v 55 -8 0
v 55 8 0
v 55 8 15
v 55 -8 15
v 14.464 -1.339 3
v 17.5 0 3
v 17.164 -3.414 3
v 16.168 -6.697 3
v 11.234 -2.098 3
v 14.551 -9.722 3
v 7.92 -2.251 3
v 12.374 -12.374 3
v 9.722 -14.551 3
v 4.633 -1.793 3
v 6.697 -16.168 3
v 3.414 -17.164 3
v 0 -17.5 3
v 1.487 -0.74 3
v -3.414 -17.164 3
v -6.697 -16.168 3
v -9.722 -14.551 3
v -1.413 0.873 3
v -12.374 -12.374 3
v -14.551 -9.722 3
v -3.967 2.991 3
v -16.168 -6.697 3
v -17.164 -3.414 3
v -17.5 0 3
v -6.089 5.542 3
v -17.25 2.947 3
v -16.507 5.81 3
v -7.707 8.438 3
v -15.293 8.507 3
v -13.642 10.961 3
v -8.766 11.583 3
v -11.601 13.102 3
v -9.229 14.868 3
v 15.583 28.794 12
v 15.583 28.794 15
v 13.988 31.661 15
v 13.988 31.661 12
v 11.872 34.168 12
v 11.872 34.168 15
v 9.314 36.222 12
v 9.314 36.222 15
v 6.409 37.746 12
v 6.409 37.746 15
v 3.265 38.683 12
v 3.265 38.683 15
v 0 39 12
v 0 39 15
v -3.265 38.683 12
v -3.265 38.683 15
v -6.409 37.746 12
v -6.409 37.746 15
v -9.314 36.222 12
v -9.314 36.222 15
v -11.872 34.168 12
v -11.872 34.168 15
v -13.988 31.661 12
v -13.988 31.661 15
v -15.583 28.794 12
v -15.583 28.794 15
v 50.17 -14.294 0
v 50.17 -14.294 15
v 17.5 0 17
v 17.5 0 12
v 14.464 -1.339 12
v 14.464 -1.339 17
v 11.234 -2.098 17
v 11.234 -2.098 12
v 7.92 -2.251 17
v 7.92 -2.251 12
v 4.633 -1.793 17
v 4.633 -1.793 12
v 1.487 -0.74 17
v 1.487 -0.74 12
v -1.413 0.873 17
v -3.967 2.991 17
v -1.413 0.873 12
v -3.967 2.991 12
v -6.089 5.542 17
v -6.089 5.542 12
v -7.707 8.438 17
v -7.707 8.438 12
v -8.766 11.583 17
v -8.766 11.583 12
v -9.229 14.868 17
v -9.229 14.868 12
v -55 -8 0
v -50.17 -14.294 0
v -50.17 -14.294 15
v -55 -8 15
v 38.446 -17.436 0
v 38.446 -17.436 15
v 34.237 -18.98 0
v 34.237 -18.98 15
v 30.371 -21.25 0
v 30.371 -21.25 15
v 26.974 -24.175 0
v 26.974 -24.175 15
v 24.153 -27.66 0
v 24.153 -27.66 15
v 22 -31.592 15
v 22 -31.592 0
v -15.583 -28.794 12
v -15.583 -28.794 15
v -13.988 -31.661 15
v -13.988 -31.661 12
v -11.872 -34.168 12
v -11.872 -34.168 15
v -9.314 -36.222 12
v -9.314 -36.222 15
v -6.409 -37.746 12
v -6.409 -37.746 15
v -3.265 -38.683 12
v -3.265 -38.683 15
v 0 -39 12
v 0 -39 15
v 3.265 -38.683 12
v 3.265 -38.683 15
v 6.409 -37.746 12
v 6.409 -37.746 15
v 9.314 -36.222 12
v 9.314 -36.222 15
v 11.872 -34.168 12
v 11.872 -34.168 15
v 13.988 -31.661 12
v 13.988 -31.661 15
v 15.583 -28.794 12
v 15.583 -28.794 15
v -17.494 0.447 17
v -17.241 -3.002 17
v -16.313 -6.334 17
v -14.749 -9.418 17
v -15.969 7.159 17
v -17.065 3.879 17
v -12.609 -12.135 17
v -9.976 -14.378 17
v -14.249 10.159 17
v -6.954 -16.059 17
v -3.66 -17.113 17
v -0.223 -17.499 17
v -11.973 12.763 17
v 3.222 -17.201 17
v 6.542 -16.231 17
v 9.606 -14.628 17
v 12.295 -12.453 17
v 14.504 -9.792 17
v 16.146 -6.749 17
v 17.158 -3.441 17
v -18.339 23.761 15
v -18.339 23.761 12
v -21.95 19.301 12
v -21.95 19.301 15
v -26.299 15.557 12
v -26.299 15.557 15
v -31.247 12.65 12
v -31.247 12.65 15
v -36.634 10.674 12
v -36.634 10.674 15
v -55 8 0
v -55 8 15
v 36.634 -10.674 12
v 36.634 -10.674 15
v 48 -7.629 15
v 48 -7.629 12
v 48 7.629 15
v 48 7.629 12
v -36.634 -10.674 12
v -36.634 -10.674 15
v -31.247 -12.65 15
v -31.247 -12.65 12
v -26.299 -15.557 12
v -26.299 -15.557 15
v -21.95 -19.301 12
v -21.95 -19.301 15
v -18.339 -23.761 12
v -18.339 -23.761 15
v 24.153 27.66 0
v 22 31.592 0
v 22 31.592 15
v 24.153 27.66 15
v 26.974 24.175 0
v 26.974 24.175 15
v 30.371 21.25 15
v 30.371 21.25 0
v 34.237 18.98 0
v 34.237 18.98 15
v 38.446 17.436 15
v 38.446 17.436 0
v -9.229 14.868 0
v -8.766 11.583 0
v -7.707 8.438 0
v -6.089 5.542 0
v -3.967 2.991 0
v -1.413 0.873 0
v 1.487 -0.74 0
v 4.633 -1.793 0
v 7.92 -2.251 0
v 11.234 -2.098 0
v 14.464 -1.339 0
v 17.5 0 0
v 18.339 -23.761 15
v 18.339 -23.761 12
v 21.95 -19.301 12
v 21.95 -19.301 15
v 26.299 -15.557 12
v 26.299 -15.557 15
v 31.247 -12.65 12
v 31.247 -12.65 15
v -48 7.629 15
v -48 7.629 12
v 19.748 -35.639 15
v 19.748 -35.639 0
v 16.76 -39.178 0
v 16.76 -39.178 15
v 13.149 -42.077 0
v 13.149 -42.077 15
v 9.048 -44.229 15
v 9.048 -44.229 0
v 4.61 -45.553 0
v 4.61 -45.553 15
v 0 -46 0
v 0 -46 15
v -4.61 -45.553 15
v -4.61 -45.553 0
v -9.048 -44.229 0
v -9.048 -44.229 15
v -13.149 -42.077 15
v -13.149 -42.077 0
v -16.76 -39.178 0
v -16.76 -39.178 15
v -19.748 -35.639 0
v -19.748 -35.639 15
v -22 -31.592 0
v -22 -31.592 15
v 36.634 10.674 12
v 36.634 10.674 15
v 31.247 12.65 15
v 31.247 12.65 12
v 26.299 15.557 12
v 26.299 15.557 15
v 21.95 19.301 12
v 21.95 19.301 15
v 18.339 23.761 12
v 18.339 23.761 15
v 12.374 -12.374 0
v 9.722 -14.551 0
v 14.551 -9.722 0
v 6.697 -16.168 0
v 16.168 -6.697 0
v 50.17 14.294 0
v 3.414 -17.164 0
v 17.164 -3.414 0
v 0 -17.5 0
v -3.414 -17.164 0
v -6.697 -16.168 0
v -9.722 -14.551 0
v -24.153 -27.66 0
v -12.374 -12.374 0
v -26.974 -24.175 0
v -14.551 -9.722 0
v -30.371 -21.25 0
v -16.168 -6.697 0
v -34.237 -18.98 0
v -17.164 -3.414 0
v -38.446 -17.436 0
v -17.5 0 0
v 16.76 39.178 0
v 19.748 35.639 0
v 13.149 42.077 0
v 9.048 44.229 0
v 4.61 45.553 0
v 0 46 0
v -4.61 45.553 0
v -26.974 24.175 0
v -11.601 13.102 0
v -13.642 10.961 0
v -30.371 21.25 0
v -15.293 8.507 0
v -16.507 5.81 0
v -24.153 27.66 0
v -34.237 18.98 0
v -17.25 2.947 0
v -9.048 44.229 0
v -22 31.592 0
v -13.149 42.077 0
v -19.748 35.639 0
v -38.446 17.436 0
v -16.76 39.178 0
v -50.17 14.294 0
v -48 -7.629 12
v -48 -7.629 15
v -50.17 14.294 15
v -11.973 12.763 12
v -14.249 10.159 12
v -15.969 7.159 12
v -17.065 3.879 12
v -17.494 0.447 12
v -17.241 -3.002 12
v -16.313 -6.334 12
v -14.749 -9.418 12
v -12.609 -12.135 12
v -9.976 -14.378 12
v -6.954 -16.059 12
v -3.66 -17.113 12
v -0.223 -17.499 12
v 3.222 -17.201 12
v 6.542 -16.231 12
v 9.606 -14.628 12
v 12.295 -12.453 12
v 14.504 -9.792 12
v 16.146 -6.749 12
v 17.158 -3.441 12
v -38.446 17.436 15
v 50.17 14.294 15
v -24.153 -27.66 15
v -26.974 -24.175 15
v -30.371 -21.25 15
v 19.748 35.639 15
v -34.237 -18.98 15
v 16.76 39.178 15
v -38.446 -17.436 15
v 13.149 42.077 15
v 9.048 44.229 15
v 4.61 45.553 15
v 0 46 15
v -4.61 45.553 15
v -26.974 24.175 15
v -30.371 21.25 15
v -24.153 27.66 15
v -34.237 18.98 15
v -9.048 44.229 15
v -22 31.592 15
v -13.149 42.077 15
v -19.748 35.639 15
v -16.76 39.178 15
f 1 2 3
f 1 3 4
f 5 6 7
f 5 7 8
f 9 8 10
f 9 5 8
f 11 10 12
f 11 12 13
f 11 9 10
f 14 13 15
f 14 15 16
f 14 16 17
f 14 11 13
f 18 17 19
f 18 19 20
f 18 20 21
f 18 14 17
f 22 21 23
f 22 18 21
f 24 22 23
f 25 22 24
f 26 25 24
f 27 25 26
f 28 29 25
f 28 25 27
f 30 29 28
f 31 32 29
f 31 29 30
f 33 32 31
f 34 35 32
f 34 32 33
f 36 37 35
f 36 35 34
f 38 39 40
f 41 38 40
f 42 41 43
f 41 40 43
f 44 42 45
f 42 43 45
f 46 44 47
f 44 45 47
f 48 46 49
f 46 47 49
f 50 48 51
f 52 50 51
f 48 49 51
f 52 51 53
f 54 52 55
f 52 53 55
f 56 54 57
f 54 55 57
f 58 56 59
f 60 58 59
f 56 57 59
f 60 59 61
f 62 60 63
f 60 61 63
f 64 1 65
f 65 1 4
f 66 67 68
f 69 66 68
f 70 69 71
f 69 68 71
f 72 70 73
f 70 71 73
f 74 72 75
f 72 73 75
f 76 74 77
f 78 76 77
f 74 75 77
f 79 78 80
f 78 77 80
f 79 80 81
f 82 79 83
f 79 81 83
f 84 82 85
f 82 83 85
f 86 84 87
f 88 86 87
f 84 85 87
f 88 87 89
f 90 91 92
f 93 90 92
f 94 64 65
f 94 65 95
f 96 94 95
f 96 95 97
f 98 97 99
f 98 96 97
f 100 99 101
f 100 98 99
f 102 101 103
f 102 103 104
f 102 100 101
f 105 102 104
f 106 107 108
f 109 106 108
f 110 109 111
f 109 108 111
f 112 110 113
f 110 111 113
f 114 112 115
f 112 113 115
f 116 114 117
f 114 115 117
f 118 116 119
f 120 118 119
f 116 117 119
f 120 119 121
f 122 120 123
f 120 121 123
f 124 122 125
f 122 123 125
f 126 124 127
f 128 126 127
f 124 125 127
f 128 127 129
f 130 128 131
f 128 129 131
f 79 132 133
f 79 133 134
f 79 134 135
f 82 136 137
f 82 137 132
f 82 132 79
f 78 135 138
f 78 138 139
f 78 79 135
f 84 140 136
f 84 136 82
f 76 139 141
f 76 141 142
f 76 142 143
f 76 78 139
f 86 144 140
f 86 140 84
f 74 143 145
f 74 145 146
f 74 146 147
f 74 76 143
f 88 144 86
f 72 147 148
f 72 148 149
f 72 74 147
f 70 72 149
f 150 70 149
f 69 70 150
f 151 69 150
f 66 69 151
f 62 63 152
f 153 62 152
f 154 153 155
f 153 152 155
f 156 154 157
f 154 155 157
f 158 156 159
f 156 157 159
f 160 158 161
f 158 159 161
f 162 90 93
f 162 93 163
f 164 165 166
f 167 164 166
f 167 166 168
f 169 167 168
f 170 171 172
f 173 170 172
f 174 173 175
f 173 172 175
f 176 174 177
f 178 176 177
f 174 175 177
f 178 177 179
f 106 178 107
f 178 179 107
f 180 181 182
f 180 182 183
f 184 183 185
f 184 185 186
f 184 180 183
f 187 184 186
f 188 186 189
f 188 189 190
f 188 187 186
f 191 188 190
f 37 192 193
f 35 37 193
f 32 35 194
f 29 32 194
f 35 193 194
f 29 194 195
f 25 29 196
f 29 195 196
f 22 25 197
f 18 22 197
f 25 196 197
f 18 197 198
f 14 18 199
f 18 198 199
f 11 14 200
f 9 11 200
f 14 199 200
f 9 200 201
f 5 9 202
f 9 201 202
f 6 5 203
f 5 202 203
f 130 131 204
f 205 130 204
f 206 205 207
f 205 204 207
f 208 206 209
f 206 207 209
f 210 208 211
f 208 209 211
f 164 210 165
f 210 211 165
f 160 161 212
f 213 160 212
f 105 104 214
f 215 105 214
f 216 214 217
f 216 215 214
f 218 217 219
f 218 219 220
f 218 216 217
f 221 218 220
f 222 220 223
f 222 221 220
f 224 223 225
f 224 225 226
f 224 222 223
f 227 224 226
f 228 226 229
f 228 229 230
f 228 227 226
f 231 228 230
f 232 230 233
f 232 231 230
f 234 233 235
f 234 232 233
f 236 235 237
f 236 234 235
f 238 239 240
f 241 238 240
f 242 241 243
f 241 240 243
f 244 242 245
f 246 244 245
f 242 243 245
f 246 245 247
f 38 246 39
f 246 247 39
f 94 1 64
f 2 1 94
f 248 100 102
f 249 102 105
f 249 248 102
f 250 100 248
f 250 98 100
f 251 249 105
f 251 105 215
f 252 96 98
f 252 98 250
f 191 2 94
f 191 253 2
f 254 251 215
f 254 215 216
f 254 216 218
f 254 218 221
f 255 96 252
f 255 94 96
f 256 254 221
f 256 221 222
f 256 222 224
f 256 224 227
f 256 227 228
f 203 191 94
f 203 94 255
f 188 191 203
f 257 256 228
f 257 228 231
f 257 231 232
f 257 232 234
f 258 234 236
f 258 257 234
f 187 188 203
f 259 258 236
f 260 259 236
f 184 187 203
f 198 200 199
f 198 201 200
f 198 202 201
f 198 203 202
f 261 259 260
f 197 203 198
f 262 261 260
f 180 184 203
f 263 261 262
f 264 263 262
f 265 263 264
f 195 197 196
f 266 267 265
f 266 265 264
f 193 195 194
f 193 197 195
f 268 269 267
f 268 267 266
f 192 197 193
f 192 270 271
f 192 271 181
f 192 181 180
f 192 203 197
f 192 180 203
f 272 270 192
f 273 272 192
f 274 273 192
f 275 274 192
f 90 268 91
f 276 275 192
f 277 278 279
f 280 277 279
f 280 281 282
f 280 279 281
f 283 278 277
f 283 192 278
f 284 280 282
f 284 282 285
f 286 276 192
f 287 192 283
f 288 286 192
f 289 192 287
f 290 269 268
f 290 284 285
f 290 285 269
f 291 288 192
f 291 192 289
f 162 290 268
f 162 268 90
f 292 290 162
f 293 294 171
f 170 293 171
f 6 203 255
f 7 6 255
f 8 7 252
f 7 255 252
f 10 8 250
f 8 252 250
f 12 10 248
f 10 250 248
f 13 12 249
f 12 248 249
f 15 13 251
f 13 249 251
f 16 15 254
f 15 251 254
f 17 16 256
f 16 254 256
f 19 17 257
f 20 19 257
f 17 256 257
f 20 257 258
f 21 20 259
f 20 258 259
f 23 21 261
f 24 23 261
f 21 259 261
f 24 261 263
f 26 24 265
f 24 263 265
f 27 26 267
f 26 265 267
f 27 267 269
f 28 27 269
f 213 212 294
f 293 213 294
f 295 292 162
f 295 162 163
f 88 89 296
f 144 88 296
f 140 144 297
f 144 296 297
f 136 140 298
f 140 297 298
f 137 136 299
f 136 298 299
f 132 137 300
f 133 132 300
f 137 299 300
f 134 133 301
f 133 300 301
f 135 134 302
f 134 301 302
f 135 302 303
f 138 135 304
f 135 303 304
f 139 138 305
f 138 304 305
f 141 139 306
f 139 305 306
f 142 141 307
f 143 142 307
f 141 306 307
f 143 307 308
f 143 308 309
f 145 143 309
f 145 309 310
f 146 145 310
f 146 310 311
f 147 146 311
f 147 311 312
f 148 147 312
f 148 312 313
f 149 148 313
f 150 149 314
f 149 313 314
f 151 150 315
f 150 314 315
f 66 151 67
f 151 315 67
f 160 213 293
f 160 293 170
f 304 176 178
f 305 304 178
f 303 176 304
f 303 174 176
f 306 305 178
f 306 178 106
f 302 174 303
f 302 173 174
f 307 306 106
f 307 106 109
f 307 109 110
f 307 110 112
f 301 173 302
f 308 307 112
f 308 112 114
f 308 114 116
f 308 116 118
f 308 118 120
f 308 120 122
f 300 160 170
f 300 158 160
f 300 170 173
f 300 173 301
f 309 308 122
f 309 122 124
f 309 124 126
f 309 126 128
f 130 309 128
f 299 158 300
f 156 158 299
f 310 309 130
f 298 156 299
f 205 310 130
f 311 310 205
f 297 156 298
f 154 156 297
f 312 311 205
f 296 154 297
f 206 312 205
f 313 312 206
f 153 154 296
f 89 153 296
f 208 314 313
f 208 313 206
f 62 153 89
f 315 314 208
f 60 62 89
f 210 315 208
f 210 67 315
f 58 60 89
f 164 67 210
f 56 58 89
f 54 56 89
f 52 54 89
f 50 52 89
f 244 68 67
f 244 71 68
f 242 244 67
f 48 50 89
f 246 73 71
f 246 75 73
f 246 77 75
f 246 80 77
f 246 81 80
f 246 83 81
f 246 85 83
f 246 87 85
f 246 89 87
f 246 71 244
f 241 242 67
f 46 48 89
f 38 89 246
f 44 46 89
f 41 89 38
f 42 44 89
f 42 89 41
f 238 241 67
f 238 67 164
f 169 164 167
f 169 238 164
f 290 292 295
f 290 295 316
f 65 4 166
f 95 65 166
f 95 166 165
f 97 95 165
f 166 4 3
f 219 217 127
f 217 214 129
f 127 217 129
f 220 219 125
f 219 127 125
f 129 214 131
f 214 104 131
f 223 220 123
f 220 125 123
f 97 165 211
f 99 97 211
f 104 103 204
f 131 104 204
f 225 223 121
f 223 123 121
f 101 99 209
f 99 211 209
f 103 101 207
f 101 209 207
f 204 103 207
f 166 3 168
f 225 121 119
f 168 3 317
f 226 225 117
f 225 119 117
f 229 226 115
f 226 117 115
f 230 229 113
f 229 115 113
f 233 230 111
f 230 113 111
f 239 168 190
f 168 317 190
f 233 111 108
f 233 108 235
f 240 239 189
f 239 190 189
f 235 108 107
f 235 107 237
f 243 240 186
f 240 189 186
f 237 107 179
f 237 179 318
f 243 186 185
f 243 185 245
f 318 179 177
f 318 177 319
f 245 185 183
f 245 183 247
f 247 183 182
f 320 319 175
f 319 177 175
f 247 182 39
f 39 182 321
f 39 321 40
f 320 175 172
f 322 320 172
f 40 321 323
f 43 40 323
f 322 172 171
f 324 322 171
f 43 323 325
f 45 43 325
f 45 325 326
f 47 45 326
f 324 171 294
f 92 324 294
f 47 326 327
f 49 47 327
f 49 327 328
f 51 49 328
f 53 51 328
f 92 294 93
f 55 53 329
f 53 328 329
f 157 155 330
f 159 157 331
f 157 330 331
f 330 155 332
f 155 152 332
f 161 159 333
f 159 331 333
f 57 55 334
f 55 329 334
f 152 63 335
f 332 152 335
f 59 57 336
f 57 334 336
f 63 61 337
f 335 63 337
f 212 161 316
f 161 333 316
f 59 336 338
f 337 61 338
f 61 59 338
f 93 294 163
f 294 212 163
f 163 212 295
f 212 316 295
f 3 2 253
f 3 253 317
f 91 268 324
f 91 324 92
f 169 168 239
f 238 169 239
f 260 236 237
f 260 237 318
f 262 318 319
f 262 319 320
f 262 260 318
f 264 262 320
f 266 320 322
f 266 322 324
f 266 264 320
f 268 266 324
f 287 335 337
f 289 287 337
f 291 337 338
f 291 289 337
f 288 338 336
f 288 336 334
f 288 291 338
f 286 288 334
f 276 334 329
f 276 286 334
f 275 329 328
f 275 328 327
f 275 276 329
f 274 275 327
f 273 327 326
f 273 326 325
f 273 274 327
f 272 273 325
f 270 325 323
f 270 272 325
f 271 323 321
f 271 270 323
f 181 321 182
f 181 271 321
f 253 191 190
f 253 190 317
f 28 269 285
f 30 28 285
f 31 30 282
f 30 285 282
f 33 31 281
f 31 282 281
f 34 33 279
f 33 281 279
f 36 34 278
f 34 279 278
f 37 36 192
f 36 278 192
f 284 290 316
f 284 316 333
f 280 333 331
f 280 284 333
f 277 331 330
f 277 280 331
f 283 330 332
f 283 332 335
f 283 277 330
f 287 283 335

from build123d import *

# Parameters (mm, degrees)
BOSS_EXTRUDE1_DEPTH = 15
CUT_EXTRUDE1_DEPTH  = 3
BOSS_EXTRUDE2_DEPTH = 5
CUT_EXTRUDE2_DEPTH  = 3
CHAMFER1_SIZE       = 5


with BuildPart() as part:
    # Sketch1 → Boss-Extrude1 (new body)
    with BuildSketch(Plane.XY):
        with BuildLine():
            Line((-55, -13), (-55, 13))
            Line((-55, 13), (-38.445821861, 17.435678664))
            ThreePointArc((-38.445821861, 17.435678664), (-28.606816649, 22.636507401), (-21.999819423, 31.592077218))
            ThreePointArc((-21.999819423, 31.592077218), (0, 46), (21.999819423, 31.592077218))
            ThreePointArc((21.999819423, 31.592077218), (28.606816649, 22.636507401), (38.445821861, 17.435678664))
            Line((38.445821861, 17.435678664), (55, 13))
            Line((55, 13), (55, -13))
            Line((55, -13), (38.445821861, -17.435678664))
            ThreePointArc((38.445821861, -17.435678664), (28.606816649, -22.636507401), (21.999819423, -31.592077218))
            ThreePointArc((21.999819423, -31.592077218), (0, -46), (-21.999819423, -31.592077218))
            ThreePointArc((-21.999819423, -31.592077218), (-28.606816649, -22.636507401), (-38.445821861, -17.435678664))
            Line((-38.445821861, -17.435678664), (-55, -13))
        make_face()
    extrude(amount=BOSS_EXTRUDE1_DEPTH)

    # Sketch2 → Cut-Extrude1 (cut)
    with BuildSketch(Plane.XY.offset(15)):
        with BuildLine():
            Line((36.634088545, -10.67419788), (48, -7.628711084))
            Line((48, -7.628711084), (48, 7.628711084))
            Line((48, 7.628711084), (36.634088545, 10.67419788))
            ThreePointArc((36.634088545, 10.67419788), (24.040161874, 17.331258664), (15.583205424, 28.79438803))
            ThreePointArc((15.583205424, 28.79438803), (0, 39), (-15.583205424, 28.79438803))
            ThreePointArc((-15.583205424, 28.79438803), (-24.040161874, 17.331258664), (-36.634088545, 10.67419788))
            Line((-36.634088545, 10.67419788), (-48, 7.628711084))
            Line((-48, 7.628711084), (-48, -7.628711084))
            Line((-48, -7.628711084), (-36.634088545, -10.67419788))
            ThreePointArc((-36.634088545, -10.67419788), (-24.040161874, -17.331258664), (-15.583205424, -28.79438803))
            ThreePointArc((-15.583205424, -28.79438803), (0, -39), (15.583205424, -28.79438803))
            ThreePointArc((15.583205424, -28.79438803), (24.040161874, -17.331258664), (36.634088545, -10.67419788))
        make_face()
    extrude(amount=-CUT_EXTRUDE1_DEPTH, mode=Mode.SUBTRACT)

    # Sketch3 → Boss-Extrude2 (add)
    with BuildSketch(Plane.XY.offset(12)):
        with BuildLine():
            ThreePointArc((-9.229359568, 14.868386663), (-8.506944444, -15.293197711), (17.5, 0))
            ThreePointArc((17.5, 0), (0, 0), (-9.229359568, 14.868386663))
        make_face()
    extrude(amount=BOSS_EXTRUDE2_DEPTH)

    # Sketch4 → Cut-Extrude2 (cut)
    with BuildSketch(Plane(origin=(0, 0, 0), x_dir=(-1, 0, 0), z_dir=(0, 0, -1))):
        with BuildLine():
            ThreePointArc((-17.5, 0), (0, -17.5), (17.5, 0))
            ThreePointArc((17.5, 0), (15.293197711, 8.506944444), (9.229359568, 14.868386663))
            ThreePointArc((9.229359568, 14.868386663), (0, 0), (-17.5, 0))
        make_face()
    extrude(amount=-CUT_EXTRUDE2_DEPTH, mode=Mode.SUBTRACT)

    # Chamfer1
    chamfer1_edges = [part.edges().sort_by_distance(p)[0] for p in [
        (55, -13, 7.5),
        (55, 13, 7.5),
        (-55, 13, 7.5),
        (-55, -13, 7.5),
    ]]
    chamfer(chamfer1_edges, length=CHAMFER1_SIZE)


solid = part.part
